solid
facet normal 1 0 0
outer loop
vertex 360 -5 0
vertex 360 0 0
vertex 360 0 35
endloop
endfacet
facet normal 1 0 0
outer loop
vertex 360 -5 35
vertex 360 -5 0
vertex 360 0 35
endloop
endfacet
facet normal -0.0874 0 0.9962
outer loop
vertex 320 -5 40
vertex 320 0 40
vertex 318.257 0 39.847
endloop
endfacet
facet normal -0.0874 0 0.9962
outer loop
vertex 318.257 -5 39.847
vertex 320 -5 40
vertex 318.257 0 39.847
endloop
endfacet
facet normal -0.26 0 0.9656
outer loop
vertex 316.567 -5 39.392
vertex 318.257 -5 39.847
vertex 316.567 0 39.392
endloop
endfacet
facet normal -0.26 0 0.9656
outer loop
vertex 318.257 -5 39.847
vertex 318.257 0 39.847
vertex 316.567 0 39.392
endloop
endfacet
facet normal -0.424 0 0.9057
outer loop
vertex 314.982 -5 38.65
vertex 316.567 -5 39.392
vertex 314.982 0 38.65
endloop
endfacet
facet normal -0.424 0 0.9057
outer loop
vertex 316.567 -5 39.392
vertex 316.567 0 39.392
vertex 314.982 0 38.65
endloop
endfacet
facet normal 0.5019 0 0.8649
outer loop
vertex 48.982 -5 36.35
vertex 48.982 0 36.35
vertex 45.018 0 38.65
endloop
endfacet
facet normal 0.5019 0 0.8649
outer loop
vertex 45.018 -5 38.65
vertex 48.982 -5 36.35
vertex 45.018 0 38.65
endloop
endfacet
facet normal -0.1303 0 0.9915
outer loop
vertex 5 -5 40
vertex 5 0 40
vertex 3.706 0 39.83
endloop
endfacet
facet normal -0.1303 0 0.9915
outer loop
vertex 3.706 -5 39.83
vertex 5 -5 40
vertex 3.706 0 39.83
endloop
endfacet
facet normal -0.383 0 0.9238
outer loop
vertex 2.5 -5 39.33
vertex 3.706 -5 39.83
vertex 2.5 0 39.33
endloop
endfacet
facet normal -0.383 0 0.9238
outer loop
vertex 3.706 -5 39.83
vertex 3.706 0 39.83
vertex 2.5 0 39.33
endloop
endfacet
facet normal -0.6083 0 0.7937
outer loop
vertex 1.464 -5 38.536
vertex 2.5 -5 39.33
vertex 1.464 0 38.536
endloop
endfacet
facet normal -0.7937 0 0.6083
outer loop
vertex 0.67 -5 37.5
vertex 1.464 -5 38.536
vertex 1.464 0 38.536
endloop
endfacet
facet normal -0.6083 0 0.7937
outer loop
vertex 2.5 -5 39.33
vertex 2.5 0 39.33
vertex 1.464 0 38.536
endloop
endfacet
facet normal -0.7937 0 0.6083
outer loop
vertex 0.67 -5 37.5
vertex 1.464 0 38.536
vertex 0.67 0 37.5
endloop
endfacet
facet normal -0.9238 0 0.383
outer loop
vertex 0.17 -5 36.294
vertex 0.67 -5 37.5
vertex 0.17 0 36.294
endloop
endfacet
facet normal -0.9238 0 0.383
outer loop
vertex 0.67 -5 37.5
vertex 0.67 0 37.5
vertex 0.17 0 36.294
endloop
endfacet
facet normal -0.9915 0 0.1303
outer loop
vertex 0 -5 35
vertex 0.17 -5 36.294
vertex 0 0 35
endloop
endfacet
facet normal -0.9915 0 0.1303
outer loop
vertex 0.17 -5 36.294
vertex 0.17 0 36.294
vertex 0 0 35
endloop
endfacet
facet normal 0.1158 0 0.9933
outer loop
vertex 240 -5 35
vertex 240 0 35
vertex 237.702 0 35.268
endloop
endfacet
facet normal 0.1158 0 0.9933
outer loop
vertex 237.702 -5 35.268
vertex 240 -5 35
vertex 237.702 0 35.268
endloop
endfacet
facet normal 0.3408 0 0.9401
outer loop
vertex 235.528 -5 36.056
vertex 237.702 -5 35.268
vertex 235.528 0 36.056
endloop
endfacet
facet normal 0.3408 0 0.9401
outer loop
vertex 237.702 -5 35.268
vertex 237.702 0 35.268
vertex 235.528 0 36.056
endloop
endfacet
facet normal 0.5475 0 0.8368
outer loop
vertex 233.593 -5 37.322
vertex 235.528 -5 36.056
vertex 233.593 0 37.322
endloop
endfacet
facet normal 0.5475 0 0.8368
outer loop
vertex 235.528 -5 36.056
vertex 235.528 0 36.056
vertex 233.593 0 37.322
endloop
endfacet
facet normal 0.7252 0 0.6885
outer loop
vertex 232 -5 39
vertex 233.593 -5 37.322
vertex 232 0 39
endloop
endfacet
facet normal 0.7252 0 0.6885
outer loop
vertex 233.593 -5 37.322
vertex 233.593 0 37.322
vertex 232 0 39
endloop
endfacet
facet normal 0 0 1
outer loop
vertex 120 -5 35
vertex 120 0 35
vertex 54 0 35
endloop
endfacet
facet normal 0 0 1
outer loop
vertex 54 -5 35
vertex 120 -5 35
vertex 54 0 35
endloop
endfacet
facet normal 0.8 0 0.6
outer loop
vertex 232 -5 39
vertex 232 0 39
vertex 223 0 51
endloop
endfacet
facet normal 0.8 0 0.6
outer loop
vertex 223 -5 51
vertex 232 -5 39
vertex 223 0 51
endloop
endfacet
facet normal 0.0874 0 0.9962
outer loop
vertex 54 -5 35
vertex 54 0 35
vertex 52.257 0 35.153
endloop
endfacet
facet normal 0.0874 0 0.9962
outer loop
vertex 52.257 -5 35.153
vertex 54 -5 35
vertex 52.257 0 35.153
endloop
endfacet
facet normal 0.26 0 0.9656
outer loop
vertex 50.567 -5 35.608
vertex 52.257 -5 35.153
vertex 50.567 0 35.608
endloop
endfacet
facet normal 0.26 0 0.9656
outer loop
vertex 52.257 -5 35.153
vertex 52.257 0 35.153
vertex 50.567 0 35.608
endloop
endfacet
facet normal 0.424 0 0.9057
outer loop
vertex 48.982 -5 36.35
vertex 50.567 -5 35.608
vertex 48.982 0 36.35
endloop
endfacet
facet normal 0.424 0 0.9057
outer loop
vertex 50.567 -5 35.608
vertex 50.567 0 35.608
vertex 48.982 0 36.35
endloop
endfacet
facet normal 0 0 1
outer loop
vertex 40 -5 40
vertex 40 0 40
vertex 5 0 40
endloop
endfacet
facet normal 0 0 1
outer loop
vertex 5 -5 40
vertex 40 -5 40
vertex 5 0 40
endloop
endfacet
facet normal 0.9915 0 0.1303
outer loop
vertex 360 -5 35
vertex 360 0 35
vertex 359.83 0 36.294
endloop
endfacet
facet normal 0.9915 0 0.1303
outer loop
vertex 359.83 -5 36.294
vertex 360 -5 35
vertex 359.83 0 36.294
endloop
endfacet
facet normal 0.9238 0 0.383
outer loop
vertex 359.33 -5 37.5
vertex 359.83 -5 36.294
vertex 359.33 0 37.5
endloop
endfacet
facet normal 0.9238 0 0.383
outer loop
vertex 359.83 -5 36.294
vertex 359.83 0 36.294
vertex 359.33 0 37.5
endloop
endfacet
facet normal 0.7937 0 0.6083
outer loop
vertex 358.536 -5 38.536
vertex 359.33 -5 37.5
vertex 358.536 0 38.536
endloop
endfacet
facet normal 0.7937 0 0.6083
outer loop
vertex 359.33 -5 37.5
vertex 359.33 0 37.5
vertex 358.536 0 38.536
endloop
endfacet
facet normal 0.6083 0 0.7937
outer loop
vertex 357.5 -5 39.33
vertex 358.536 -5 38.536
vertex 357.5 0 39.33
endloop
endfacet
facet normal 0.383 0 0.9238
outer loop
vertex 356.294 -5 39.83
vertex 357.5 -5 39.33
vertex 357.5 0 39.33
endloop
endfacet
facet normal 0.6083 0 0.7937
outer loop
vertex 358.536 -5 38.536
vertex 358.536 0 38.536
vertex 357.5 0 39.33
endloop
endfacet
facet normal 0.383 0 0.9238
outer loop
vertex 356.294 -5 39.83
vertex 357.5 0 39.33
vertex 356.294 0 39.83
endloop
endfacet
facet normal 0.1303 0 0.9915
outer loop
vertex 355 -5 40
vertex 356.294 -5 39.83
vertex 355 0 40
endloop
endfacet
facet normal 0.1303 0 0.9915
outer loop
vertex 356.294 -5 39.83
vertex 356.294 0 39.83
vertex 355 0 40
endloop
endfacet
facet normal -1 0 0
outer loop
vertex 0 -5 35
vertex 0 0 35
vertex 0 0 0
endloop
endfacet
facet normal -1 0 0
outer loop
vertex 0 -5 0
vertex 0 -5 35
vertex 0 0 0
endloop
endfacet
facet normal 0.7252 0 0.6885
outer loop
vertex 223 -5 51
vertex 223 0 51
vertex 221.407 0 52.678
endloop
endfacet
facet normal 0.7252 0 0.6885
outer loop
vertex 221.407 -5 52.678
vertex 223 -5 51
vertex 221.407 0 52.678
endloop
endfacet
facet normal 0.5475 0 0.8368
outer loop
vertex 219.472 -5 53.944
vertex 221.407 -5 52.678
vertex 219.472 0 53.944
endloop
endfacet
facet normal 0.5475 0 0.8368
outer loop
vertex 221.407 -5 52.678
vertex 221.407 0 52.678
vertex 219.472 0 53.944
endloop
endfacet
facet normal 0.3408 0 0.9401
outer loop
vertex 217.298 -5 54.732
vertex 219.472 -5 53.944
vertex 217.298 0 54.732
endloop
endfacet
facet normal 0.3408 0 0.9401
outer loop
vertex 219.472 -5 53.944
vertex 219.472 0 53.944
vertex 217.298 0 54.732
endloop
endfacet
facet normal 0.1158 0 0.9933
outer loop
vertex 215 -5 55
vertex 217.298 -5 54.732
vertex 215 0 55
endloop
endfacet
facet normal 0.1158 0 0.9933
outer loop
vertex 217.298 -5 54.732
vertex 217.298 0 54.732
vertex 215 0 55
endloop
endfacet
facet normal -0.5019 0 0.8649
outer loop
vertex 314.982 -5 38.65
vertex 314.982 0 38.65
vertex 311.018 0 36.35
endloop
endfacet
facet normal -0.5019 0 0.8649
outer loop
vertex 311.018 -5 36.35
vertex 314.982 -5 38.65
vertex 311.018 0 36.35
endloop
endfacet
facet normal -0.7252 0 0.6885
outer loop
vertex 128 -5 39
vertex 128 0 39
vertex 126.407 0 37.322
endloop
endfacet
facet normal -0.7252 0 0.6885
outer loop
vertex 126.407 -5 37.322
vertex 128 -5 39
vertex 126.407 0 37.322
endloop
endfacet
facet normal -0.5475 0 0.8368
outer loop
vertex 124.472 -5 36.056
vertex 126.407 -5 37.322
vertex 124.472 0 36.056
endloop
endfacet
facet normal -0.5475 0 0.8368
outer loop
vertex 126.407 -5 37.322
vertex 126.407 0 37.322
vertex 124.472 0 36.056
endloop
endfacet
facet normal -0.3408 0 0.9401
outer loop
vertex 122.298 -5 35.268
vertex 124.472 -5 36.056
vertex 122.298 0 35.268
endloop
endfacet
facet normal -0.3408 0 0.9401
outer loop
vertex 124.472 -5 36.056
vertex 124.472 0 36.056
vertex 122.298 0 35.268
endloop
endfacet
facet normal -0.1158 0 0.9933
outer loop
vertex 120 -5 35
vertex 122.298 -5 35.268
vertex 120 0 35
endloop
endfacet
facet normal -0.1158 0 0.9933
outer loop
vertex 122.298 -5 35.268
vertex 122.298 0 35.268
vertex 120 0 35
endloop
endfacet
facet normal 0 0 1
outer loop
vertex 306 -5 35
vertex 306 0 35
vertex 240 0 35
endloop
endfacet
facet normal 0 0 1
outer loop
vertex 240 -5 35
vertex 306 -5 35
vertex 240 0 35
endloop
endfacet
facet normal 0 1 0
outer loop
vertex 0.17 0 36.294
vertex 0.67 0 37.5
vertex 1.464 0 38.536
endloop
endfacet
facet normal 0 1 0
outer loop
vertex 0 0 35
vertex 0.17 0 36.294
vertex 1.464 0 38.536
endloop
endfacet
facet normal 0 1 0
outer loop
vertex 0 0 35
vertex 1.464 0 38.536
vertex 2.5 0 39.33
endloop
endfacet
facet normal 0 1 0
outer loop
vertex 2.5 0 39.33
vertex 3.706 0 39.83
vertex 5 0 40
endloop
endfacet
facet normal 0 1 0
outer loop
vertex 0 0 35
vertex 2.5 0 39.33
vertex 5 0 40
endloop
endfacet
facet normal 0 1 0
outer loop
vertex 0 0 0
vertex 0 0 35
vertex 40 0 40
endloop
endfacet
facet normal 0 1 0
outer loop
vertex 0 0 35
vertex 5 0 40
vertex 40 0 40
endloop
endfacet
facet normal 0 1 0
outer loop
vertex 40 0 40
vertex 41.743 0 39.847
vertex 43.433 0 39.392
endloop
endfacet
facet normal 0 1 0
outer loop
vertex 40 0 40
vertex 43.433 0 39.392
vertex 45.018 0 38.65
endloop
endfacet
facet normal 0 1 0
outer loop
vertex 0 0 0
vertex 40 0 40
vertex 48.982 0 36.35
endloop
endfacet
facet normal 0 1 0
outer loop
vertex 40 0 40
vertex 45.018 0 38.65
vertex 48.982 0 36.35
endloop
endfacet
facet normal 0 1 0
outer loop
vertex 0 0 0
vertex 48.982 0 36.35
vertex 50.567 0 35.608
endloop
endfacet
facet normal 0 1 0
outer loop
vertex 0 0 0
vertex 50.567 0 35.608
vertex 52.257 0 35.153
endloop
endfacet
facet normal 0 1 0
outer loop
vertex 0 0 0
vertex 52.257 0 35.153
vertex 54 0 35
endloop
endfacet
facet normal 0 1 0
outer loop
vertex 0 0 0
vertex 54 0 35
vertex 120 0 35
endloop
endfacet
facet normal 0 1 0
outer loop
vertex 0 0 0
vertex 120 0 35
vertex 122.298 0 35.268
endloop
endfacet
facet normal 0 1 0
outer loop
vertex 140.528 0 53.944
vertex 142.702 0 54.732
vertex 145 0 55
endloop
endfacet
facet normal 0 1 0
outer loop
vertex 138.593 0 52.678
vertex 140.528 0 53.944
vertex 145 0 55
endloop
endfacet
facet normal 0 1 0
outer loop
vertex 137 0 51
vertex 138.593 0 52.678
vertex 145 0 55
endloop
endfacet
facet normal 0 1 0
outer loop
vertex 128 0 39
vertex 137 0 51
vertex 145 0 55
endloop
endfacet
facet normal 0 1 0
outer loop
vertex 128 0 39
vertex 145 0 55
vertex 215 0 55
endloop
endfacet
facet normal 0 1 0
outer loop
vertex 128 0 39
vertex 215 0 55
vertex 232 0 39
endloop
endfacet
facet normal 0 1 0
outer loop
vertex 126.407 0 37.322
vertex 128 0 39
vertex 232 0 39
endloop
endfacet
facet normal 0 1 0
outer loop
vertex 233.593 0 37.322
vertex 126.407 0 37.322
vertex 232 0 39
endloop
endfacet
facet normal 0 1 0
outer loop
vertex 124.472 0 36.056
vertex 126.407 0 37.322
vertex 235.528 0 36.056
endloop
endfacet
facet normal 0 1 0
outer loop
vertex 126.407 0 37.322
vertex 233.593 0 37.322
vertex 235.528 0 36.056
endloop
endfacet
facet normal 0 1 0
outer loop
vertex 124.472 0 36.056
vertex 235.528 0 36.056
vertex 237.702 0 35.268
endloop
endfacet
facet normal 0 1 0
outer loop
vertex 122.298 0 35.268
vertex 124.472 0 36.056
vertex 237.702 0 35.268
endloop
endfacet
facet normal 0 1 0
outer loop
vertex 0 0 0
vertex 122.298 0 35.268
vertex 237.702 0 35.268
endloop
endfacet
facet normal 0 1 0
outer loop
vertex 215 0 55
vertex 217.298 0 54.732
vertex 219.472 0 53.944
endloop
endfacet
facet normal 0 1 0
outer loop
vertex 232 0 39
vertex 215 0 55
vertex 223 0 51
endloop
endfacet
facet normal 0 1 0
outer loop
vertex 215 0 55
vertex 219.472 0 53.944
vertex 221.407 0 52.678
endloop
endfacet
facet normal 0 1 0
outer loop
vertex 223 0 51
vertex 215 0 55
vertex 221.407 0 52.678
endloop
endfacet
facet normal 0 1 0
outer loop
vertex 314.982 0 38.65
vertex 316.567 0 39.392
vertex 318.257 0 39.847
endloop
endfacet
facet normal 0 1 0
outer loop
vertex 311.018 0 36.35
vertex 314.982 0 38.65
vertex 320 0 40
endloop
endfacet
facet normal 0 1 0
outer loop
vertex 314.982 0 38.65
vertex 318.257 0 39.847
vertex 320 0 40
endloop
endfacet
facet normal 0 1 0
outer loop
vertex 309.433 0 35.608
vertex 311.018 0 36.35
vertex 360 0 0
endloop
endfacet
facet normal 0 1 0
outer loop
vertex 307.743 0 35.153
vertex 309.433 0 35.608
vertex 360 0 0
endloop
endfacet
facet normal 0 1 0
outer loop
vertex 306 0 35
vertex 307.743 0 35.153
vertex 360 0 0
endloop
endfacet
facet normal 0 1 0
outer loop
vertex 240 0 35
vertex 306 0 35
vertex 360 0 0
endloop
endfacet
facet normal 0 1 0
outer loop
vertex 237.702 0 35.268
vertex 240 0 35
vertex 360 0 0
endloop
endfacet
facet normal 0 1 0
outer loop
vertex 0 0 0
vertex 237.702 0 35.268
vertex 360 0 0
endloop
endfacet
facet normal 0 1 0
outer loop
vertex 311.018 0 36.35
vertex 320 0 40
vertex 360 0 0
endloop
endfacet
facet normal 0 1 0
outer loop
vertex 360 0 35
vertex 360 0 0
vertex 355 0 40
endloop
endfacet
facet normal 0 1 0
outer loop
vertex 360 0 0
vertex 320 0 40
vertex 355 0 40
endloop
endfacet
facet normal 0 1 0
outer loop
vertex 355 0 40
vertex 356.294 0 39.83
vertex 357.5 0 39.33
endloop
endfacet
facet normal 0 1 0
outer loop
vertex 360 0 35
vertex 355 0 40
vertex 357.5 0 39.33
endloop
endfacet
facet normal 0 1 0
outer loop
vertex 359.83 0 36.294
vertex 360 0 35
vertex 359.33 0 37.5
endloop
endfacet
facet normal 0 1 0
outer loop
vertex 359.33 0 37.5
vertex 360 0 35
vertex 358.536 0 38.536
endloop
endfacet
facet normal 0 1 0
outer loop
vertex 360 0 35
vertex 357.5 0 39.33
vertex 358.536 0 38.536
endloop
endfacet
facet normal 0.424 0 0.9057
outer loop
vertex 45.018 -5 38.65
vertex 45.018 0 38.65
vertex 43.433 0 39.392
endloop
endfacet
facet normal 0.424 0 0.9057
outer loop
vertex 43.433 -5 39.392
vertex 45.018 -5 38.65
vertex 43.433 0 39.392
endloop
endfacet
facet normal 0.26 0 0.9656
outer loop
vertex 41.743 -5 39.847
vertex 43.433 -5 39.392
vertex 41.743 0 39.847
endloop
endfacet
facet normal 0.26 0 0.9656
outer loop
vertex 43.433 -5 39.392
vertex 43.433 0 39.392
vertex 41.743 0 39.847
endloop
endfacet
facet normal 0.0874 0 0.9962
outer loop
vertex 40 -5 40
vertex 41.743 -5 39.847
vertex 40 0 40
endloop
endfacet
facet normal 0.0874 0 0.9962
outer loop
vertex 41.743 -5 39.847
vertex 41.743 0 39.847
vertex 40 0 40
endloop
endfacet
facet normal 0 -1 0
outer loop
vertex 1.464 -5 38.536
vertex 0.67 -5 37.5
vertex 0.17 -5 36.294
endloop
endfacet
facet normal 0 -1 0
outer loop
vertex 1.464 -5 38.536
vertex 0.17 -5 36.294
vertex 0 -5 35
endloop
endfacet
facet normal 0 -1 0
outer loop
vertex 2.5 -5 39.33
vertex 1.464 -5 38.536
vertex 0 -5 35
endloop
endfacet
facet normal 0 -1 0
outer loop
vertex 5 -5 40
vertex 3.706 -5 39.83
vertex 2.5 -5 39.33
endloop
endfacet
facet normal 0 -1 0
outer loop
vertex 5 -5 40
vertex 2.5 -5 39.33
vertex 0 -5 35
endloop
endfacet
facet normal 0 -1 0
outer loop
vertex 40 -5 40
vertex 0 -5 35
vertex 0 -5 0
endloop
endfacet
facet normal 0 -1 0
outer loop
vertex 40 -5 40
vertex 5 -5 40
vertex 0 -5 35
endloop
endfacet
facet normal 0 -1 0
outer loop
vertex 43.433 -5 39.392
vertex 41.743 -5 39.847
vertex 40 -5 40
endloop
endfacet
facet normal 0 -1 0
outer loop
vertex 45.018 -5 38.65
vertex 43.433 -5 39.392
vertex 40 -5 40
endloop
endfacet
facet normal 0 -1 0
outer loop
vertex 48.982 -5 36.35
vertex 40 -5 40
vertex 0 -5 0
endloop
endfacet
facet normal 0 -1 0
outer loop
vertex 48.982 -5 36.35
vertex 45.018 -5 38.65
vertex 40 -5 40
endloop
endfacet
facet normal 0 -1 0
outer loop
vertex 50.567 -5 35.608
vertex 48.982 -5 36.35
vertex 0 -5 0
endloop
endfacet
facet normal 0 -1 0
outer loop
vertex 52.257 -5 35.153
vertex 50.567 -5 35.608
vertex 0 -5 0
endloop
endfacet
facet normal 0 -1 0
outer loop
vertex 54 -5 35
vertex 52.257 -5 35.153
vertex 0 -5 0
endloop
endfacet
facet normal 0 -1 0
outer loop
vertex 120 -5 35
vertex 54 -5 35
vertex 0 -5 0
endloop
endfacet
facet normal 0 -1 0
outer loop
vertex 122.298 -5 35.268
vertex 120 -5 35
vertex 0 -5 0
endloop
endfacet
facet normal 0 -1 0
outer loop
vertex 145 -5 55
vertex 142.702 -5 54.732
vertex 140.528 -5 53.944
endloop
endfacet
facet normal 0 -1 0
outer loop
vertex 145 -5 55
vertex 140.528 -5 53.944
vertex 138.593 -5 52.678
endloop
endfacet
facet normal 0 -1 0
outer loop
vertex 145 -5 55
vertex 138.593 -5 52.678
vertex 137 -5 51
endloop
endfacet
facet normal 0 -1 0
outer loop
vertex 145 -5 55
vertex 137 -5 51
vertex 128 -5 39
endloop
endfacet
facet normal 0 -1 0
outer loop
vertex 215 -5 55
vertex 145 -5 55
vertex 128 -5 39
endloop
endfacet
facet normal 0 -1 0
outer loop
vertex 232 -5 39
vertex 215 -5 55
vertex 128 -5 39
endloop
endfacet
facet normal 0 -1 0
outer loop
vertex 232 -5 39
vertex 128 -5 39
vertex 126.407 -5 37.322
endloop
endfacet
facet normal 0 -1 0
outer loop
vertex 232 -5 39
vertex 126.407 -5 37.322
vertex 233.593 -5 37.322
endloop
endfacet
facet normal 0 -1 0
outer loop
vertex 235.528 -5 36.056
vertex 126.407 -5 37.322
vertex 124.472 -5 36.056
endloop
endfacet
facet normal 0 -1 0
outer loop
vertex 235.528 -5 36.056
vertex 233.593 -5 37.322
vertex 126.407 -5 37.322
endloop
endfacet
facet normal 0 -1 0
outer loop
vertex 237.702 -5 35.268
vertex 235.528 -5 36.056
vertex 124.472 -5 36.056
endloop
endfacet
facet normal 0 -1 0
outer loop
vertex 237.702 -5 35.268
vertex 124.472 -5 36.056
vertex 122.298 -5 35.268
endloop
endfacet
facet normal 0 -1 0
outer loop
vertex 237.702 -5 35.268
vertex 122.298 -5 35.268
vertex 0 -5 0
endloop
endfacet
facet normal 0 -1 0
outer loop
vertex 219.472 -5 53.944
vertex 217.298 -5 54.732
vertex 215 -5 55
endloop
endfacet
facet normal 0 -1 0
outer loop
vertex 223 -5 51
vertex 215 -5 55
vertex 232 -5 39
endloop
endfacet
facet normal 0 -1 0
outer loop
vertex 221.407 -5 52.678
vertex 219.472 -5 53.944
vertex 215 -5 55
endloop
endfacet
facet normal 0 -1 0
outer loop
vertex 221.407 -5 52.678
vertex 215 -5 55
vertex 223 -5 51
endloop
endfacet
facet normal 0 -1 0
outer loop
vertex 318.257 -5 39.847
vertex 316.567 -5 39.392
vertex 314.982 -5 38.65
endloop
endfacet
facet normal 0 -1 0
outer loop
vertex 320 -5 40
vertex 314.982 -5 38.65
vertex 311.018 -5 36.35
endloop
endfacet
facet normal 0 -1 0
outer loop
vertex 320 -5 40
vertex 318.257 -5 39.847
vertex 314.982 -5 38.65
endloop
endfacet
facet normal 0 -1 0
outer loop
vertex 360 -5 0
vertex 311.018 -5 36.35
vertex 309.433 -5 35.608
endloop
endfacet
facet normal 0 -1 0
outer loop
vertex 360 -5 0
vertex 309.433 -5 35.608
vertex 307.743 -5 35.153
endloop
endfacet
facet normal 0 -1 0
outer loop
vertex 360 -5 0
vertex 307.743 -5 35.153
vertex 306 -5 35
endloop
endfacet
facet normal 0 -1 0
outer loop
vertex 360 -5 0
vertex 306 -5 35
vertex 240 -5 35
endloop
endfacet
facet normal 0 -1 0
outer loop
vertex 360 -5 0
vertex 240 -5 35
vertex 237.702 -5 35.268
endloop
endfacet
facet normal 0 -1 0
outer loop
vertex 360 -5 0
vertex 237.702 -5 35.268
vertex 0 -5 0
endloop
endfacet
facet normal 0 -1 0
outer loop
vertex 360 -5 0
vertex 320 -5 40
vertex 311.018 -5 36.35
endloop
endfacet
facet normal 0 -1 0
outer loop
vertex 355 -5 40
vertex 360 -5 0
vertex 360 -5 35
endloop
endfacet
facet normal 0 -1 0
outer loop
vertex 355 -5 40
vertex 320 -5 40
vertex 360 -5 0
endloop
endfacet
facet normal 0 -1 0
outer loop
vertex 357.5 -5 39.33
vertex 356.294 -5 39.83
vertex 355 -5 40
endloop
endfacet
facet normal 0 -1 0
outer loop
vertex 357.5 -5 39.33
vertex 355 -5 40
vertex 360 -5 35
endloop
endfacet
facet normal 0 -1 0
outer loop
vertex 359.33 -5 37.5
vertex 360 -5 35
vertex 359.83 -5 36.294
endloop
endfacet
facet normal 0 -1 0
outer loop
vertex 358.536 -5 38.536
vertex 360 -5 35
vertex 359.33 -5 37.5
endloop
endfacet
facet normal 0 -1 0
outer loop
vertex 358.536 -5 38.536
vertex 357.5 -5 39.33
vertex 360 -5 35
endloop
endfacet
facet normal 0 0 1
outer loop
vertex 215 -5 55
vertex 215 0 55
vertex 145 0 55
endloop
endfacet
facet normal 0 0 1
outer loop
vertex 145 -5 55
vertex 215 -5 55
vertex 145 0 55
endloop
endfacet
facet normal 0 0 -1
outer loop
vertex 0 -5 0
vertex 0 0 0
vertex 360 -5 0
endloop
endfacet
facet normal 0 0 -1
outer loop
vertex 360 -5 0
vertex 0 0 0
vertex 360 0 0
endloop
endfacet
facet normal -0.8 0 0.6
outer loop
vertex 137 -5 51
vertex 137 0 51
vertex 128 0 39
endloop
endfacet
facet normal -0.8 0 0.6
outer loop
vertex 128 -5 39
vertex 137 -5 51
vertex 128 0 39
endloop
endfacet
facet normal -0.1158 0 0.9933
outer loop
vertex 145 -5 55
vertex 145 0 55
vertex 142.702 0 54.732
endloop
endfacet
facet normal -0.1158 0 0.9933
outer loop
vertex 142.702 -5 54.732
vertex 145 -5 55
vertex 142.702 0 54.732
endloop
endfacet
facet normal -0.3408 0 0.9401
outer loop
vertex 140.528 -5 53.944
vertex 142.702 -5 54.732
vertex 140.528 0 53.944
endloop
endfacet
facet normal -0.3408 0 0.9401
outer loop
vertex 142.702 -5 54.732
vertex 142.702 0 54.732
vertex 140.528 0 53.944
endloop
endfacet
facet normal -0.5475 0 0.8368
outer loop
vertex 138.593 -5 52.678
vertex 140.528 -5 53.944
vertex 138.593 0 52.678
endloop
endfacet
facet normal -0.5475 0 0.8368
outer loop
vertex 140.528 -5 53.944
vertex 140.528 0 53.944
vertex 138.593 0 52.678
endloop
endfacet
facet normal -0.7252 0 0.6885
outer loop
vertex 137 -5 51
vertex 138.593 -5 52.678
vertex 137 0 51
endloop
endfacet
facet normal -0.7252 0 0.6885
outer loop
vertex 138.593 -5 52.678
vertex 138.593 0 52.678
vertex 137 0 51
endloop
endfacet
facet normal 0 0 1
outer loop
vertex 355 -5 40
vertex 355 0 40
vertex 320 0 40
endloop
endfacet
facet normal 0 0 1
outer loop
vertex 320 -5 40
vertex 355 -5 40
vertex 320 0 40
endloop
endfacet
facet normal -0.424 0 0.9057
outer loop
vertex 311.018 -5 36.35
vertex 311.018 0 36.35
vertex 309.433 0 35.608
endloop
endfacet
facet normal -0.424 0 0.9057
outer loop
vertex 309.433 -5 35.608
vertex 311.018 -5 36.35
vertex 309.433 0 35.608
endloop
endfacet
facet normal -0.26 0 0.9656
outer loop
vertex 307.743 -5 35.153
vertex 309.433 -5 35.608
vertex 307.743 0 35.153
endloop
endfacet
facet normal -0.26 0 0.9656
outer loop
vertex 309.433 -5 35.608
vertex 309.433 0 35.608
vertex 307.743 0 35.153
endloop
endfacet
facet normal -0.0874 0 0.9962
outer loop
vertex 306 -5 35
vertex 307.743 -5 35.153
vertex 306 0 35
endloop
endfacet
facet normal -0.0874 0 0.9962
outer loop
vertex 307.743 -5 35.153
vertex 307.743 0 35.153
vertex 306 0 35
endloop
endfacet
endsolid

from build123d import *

# Parameters (mm, degrees)
F1_DEPTH = 5


with BuildPart() as f1:
    # F0 (on Front) → F1 (new body)
    with BuildSketch(Plane.XZ):
        with BuildLine():
            Line((0, 35), (0, 0))
            Line((0, 0), (180, 0))
            Line((180, 0), (360, 0))
            Line((360, 0), (360, 35))
            ThreePointArc((360, 35), (358.535534, 38.535534), (355, 40))
            Line((355, 40), (320, 40))
            ThreePointArc((320, 40), (317.401719, 39.656549), (314.981915, 38.649788))
            Line((314.981915, 38.649788), (311.018085, 36.350212))
            ThreePointArc((311.018085, 36.350212), (308.598281, 35.343451), (306, 35))
            Line((306, 35), (240, 35))
            ThreePointArc((240, 35), (235.527864, 36.055728), (232, 39))
            Line((232, 39), (223, 51))
            ThreePointArc((223, 51), (219.472136, 53.944272), (215, 55))
            Line((215, 55), (180, 55))
            Line((180, 55), (145, 55))
            ThreePointArc((145, 55), (140.527864, 53.944272), (137, 51))
            Line((137, 51), (128, 39))
            ThreePointArc((128, 39), (124.472136, 36.055728), (120, 35))
            Line((120, 35), (54, 35))
            ThreePointArc((54, 35), (51.401719, 35.343451), (48.981915, 36.350212))
            Line((48.981915, 36.350212), (45.018085, 38.649788))
            ThreePointArc((45.018085, 38.649788), (42.598281, 39.656549), (40, 40))
            Line((40, 40), (5, 40))
            ThreePointArc((5, 40), (1.464466, 38.535534), (0, 35))
        make_face()
    extrude(amount=F1_DEPTH)


solid = f1.part
